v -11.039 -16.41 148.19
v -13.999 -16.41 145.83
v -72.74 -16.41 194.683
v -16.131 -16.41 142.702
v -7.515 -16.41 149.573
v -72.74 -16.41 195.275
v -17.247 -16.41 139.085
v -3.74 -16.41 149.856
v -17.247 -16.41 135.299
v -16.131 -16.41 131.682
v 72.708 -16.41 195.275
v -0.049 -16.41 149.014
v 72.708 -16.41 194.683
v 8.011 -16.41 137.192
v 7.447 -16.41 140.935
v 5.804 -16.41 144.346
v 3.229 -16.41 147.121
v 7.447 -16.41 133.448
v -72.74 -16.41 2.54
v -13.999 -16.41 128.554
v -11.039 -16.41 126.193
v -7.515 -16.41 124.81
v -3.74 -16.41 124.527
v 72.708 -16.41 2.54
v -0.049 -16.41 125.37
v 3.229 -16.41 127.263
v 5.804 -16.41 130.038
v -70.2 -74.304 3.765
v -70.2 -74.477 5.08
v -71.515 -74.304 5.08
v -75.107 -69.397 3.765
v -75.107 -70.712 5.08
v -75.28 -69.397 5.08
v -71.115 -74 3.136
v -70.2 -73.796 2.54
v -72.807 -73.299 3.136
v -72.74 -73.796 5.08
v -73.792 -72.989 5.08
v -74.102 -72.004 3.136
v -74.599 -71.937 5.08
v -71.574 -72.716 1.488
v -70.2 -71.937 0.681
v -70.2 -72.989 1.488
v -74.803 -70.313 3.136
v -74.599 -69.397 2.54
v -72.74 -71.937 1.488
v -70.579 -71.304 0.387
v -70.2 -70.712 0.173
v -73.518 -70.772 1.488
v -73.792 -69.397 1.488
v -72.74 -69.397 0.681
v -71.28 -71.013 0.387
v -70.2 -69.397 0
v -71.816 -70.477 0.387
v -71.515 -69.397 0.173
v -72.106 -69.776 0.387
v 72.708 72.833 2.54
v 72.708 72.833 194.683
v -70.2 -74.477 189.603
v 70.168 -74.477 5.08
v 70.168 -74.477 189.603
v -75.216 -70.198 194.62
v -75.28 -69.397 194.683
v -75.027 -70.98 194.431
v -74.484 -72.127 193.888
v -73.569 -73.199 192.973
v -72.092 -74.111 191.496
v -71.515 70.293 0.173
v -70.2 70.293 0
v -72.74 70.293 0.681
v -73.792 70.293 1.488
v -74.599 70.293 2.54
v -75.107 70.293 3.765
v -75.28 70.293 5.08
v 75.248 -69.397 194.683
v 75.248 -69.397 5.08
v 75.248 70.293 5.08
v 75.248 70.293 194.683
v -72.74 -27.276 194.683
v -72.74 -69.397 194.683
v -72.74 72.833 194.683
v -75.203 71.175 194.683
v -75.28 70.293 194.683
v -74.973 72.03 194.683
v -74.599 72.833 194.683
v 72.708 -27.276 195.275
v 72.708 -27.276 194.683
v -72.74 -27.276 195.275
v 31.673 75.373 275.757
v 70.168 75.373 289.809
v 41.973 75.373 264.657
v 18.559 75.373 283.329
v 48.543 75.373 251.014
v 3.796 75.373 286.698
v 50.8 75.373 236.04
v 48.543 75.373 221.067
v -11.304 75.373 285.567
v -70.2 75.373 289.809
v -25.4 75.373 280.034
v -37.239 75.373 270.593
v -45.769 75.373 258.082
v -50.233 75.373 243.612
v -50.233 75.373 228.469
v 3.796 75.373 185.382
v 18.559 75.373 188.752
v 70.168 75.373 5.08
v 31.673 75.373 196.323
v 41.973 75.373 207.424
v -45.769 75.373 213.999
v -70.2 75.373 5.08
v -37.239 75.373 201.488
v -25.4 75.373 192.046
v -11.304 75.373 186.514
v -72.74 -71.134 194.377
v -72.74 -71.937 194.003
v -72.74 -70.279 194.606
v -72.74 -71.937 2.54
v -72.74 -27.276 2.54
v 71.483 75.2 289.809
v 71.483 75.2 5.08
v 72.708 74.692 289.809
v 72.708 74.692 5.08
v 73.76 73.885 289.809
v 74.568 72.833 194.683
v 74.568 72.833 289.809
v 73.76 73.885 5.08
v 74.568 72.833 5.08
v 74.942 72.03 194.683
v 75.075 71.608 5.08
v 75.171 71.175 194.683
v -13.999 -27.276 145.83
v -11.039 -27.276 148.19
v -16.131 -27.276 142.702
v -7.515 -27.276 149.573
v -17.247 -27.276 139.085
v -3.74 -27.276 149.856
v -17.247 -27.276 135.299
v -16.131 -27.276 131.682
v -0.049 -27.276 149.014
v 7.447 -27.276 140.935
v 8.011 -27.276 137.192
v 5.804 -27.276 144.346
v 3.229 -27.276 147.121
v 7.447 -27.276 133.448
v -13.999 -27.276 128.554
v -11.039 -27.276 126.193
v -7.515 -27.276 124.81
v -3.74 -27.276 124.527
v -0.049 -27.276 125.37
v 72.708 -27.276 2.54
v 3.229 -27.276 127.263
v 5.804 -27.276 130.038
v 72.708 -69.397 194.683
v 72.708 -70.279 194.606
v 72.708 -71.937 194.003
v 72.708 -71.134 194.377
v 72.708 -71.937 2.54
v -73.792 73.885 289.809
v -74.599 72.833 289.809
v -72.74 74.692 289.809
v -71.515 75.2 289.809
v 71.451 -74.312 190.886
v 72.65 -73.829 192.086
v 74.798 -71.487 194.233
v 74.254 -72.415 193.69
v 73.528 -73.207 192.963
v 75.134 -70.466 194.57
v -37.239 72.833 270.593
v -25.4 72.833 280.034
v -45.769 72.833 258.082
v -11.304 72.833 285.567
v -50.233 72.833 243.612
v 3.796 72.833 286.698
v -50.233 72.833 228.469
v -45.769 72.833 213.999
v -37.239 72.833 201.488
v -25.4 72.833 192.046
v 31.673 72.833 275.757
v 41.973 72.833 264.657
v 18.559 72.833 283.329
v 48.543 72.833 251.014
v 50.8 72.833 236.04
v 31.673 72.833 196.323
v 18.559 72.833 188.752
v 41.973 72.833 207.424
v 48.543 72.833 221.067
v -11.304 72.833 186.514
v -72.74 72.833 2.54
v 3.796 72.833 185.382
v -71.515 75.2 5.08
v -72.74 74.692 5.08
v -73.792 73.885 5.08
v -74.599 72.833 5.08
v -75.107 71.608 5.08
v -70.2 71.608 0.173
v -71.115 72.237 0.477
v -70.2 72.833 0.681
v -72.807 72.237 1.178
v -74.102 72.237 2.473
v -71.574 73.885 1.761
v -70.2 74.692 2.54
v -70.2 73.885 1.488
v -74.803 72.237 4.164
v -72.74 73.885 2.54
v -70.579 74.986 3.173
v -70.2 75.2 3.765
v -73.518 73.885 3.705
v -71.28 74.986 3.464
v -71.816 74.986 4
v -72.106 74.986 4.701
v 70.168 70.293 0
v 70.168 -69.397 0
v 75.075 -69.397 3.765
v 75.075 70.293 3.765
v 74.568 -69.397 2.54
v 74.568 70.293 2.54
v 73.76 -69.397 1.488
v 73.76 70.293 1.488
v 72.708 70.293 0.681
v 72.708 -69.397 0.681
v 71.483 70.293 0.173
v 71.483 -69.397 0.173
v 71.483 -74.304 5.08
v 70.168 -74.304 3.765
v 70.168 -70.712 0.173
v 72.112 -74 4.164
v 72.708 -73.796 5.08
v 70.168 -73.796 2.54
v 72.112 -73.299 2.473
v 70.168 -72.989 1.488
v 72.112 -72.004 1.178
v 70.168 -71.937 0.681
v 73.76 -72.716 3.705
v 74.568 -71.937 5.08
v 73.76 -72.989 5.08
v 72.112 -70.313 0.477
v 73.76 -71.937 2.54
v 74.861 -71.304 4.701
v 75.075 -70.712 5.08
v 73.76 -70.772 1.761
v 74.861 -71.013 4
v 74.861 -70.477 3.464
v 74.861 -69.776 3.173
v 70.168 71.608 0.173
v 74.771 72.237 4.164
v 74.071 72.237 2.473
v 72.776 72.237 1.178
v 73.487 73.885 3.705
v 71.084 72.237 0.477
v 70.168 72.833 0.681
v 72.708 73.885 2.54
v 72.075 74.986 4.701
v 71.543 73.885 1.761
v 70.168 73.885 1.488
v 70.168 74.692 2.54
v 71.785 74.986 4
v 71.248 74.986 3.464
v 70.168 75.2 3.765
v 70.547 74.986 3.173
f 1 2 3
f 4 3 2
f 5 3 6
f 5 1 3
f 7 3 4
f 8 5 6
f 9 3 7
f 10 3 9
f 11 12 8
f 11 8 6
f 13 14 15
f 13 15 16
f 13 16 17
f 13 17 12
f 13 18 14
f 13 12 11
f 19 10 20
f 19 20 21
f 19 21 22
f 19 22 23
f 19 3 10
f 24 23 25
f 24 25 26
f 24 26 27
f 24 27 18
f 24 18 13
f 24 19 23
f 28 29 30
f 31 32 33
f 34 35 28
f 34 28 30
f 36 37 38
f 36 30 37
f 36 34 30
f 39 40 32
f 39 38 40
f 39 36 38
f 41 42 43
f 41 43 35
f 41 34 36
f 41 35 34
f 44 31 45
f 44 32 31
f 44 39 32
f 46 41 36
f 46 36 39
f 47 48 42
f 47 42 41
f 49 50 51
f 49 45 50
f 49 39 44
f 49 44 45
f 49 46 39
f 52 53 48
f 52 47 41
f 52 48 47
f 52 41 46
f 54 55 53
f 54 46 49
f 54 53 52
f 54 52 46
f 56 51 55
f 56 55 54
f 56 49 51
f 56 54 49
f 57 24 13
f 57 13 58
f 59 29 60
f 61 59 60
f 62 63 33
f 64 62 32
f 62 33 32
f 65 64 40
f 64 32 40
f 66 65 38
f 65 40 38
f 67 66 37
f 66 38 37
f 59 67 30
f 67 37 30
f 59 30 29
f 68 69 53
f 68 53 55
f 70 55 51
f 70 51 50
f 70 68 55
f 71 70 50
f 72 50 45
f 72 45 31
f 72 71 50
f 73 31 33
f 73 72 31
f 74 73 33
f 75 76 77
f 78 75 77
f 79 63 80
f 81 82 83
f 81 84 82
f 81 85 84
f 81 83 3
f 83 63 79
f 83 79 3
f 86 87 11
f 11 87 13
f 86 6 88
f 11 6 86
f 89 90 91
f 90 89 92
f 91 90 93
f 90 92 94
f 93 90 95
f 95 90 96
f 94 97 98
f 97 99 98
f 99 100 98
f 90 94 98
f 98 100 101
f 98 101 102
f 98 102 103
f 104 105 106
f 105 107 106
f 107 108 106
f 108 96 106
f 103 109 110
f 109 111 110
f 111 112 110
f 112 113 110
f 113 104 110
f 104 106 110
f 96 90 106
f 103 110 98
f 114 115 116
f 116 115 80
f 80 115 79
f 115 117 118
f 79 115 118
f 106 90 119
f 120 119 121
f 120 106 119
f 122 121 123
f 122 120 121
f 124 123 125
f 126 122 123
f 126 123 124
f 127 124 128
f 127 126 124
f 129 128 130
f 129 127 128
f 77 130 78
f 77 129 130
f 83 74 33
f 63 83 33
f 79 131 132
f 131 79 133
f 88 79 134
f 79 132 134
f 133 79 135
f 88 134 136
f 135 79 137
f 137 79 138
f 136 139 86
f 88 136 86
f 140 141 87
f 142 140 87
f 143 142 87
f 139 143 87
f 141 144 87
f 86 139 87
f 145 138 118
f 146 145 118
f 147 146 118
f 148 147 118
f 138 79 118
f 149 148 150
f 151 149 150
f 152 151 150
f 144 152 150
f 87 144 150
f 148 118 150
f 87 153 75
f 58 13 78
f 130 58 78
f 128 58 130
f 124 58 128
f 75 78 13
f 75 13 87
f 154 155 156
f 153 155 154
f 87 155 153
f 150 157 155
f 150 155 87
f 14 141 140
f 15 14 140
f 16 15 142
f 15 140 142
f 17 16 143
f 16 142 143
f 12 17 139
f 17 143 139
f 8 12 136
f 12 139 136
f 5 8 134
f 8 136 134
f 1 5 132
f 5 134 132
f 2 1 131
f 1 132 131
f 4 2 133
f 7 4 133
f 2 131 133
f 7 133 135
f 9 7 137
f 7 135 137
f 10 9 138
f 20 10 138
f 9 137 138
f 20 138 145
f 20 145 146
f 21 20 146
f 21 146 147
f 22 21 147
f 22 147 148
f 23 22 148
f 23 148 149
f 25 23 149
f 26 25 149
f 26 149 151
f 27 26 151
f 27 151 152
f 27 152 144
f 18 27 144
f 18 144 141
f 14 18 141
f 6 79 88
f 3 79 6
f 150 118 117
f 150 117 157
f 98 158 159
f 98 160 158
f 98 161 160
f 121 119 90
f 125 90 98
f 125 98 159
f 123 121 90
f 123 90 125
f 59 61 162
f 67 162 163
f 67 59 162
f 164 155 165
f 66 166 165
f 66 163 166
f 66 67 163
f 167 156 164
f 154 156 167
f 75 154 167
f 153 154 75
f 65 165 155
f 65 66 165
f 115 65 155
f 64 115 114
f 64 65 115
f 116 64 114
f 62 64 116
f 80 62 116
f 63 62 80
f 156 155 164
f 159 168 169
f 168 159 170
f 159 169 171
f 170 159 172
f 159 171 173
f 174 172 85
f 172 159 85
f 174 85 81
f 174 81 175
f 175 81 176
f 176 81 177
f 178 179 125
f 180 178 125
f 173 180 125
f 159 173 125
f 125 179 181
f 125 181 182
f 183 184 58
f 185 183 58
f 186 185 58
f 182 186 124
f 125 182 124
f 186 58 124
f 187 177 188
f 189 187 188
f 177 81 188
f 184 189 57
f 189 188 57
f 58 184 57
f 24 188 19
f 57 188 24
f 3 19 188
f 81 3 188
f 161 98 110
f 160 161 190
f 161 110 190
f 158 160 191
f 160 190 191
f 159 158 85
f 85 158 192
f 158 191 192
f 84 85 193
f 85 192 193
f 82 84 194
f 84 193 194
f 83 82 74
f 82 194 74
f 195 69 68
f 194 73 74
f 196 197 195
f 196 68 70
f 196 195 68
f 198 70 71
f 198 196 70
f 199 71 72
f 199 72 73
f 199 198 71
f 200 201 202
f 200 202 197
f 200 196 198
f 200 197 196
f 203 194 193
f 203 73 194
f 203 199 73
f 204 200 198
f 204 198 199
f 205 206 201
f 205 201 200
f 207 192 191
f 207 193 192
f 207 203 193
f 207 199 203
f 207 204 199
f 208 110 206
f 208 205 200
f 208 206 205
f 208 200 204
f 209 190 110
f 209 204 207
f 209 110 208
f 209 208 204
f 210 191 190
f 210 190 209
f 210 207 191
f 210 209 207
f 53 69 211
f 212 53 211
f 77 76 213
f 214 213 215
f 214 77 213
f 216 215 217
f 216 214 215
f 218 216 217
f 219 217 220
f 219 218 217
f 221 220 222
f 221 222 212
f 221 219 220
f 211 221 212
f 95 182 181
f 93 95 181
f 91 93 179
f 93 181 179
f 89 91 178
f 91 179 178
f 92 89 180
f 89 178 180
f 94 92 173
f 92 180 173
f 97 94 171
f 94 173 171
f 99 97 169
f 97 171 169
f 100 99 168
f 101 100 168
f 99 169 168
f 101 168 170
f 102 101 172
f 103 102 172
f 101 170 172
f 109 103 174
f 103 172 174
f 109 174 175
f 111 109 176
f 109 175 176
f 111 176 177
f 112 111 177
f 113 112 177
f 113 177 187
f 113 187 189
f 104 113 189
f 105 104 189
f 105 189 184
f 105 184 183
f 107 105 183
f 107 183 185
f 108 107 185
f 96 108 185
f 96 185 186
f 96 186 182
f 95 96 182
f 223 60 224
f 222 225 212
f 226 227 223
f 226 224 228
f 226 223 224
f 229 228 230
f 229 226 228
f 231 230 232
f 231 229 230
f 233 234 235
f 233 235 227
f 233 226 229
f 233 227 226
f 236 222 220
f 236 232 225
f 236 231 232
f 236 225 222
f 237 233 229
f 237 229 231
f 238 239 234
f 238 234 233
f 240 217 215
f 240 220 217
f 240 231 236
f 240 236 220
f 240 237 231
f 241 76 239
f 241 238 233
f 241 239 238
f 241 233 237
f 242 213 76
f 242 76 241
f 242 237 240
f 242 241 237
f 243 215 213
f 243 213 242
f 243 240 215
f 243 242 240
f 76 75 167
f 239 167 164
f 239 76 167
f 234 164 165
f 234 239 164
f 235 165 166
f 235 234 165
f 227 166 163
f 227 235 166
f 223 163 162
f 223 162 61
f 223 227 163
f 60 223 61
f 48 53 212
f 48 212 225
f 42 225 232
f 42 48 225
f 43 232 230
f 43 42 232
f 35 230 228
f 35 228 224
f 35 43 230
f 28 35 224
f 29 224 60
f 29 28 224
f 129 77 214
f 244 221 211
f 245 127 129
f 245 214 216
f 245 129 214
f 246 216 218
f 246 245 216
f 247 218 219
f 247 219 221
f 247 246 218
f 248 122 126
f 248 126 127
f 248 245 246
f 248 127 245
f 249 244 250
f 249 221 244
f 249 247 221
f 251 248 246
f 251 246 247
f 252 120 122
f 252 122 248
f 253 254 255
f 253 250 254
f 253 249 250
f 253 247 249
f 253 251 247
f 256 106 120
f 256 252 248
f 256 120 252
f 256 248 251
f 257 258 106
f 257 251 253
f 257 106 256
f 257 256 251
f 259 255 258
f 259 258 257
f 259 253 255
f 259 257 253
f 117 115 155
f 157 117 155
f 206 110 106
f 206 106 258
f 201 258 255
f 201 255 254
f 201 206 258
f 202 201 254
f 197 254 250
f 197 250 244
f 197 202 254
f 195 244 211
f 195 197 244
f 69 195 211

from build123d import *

# Parameters (mm, degrees)
F0_W         = 150.5279913545
F0_H         = 149.8499512672
F1_DEPTH     = 194.6834623814
F2_T         = -2.54
F3_W         = 2.54
F3_H         = 2.54
F4_DEPTH     = 95.1251834631
F6_D         = 101.6
F6_DEPTH     = 2.541
F7_T1_DEPTH  = 202.3034623814
F7_T3_DEPTH  = 297.4286458445
F7_T5_DEPTH  = 140.3679913545
F7_T7_DEPTH  = 139.6899512672
F7_T9_DEPTH  = 175.9279913545
F7_S13_W     = 5.08
F7_S13_H     = 5.08
F7_T14_DEPTH = 5.08
F7_S19_W     = 5.08
F7_S19_H     = 5.08
F7_T20_DEPTH = 5.08
F7_S25_W     = 5.08
F7_S25_H     = 5.08
F7_T26_DEPTH = 5.08
F7_S31_W     = 5.08
F7_S31_H     = 5.08
F7_T32_DEPTH = 5.08
F8_W         = 145.4479913545
F8_H         = 10.8655169606
F9_DEPTH     = 192.7349418402
F11_D        = 25.4
F11_DEPTH    = 12.7
F11_TIP      = 7.6309298617


# Not quite as in the source:
# - a fillet or chamfer that OpenCascade refuses, or shapes differently, is made with other operations: its cross-section is extruded or revolved along the edge and cut away or added


with BuildPart() as f1:
    # F0 (on Top) → F1 (new body)
    with BuildSketch(Plane.XY):
        with Locations((-0.0158064067, 0.4480481148)):
            Rectangle(F0_W, F0_H)
    extrude(amount=F1_DEPTH)

    # F2
    f2_openings = [f1.faces().sort_by_distance(p)[0] for p in [
        (-0.015806, 0.448048, 194.683462),
    ]]
    offset(amount=F2_T, openings=f2_openings)

    # F3 (on face) → F4 (join)
    with BuildSketch(Plane.XY.offset(194.6834623814)):
        Polygon((72.7081892705, 75.3730237484), (-75.279802084, 75.3730237484), (-75.279802084, 72.8330237484), (-72.739802084, 72.8330237484), (72.7081892705, 72.8330237484), align=None)
        with Locations((73.9781892705, 74.1030237484)):
            Rectangle(F3_W, F3_H)
    extrude(amount=F4_DEPTH)

    # F6 (through all, one way)
    with BuildSketch(Plane.XZ.offset(-72.8330237484)):
        with Locations((0, 236.040353775)):
            Circle(F6_D / 2)
    extrude(amount=-F6_DEPTH, mode=Mode.SUBTRACT)

    # F7: fillet of radius 5.08 on 9 edges, made by hand

    # F7_s2 → F7_t1 (cut)
    with BuildSketch(Plane.XY.offset(5.08)):
        with BuildLine():
            ThreePointArc((-75.279802084, -69.3969275188), (-73.7919045324, -72.9890299673), (-70.199802084, -74.4769275188))
            Line((-70.199802084, -74.4769275188), (-75.279802084, -74.4769275188))
            Line((-75.279802084, -74.4769275188), (-75.279802084, -69.3969275188))
        make_face()
        with BuildLine():
            ThreePointArc((75.2481892705, -69.3969275188), (73.7602917189, -72.9890299673), (70.1681892705, -74.4769275188))
            Line((70.1681892705, -74.4769275188), (75.2481892705, -74.4769275188))
            Line((75.2481892705, -74.4769275188), (75.2481892705, -69.3969275188))
        make_face()
    extrude(amount=F7_T1_DEPTH, mode=Mode.SUBTRACT)

    # F7_s4 → F7_t3 (cut)
    with BuildSketch(Plane.XY.offset(5.08)):
        with BuildLine():
            ThreePointArc((-70.199802084, 75.3730237484), (-73.7919045324, 73.8851261968), (-75.279802084, 70.2930237484))
            Line((-75.279802084, 70.2930237484), (-75.279802084, 75.3730237484))
            Line((-75.279802084, 75.3730237484), (-70.199802084, 75.3730237484))
        make_face()
        with BuildLine():
            ThreePointArc((70.1681892705, 75.3730237484), (73.7602917189, 73.8851261968), (75.2481892705, 70.2930237484))
            Line((75.2481892705, 70.2930237484), (75.2481892705, 75.3730237484))
            Line((75.2481892705, 75.3730237484), (70.1681892705, 75.3730237484))
        make_face()
    extrude(amount=F7_T3_DEPTH, mode=Mode.SUBTRACT)

    # F7_s6 → F7_t5 (cut)
    with BuildSketch(Plane.YZ.offset(-70.199802084)):
        with BuildLine():
            ThreePointArc((75.3730237484, 5.08), (73.8851261968, 1.4878975516), (70.2930237484, 0))
            Line((70.2930237484, 0), (75.3730237484, 0))
            Line((75.3730237484, 0), (75.3730237484, 5.08))
        make_face()
        with BuildLine():
            ThreePointArc((-69.3969275188, 0), (-72.9890299673, 1.4878975516), (-74.4769275188, 5.08))
            Line((-74.4769275188, 5.08), (-74.4769275188, 0))
            Line((-74.4769275188, 0), (-69.3969275188, 0))
        make_face()
    extrude(amount=F7_T5_DEPTH, mode=Mode.SUBTRACT)

    # F7_s8 → F7_t7 (cut)
    with BuildSketch(Plane.XZ.offset(-70.2930237484)):
        with BuildLine():
            ThreePointArc((-70.199802084, 0), (-73.7919045324, 1.4878975516), (-75.279802084, 5.08))
            Line((-75.279802084, 5.08), (-75.279802084, 0))
            Line((-75.279802084, 0), (-70.199802084, 0))
        make_face()
        with BuildLine():
            ThreePointArc((75.2481892705, 5.08), (73.7602917189, 1.4878975516), (70.1681892705, 0))
            Line((70.1681892705, 0), (75.2481892705, 0))
            Line((75.2481892705, 0), (75.2481892705, 5.08))
        make_face()
    extrude(amount=F7_T7_DEPTH, mode=Mode.SUBTRACT)

    # F7_s10 → F7_t9 (cut)
    with BuildSketch(Plane.YZ.offset(-87.979802084)):
        with BuildLine():
            ThreePointArc((-74.4769275188, 189.6034623814), (-72.9890299673, 193.1955648298), (-69.3969275188, 194.6834623814))
            Line((-69.3969275188, 194.6834623814), (-74.4769275188, 194.6834623814))
            Line((-74.4769275188, 194.6834623814), (-74.4769275188, 189.6034623814))
        make_face()
    extrude(amount=F7_T9_DEPTH, mode=Mode.SUBTRACT)


with BuildPart() as f7_tool12:
    # F7_s13 → F7_t14 (new body)
    with BuildSketch(Plane.XY.offset(5.08)):
        with Locations((-72.739802084, -71.9369275188)):
            Rectangle(F7_S13_W, F7_S13_H)
    extrude(amount=-F7_T14_DEPTH)

    # F7_s15 → F7_t16 (revolve, cut)
    with BuildSketch(Plane(origin=(-70.199802084, -69.3969275188, 5.08), x_dir=(0.7071067812, 0.7071067812, 0), z_dir=(-0.7071067812, 0.7071067812, 0))):
        with BuildLine():
            ThreePointArc((0, -5.08), (5.08, 0), (0, 5.08))
            Line((0, 5.08), (0, -5.08))
        make_face()
    revolve(axis=Axis((-70.199802084, -69.3969275188, 5.08), (0, 0, -1)), mode=Mode.SUBTRACT)


with BuildPart() as f1_1:
    add(f1.part)

    # F7_t11: cut F7_tool12
    add(f7_tool12.part, mode=Mode.SUBTRACT)


with BuildPart() as f7_tool18:
    # F7_s19 → F7_t20 (new body)
    with BuildSketch(Plane.XZ.offset(-70.2930237484)):
        with Locations((-72.739802084, 2.54)):
            Rectangle(F7_S19_W, F7_S19_H)
    extrude(amount=-F7_T20_DEPTH)

    # F7_s21 → F7_t22 (revolve, cut)
    with BuildSketch(Plane(origin=(-70.199802084, 70.2930237484, 5.08), x_dir=(0.7071067812, 0, 0.7071067812), z_dir=(-0.7071067812, 0, 0.7071067812))):
        with BuildLine():
            ThreePointArc((0, -5.08), (5.08, 0), (0, 5.08))
            Line((0, 5.08), (0, -5.08))
        make_face()
    revolve(axis=Axis((-70.199802084, 70.2930237484, 5.08), (0, 1, 0)), mode=Mode.SUBTRACT)


with BuildPart() as f1_2:
    add(f1_1.part)

    # F7_t17: cut F7_tool18
    add(f7_tool18.part, mode=Mode.SUBTRACT)


with BuildPart() as f7_tool24:
    # F7_s25 → F7_t26 (new body)
    with BuildSketch(Plane.XZ.offset(-70.2930237484)):
        with Locations((72.7081892705, 2.54)):
            Rectangle(F7_S25_W, F7_S25_H)
    extrude(amount=-F7_T26_DEPTH)

    # F7_s27 → F7_t28 (revolve, cut)
    with BuildSketch(Plane(origin=(70.1681892705, 70.2930237484, 5.08), x_dir=(-0.7071067812, 0, 0.7071067812), z_dir=(-0.7071067812, 0, -0.7071067812))):
        with BuildLine():
            ThreePointArc((0, -5.08), (5.08, 0), (0, 5.08))
            Line((0, 5.08), (0, -5.08))
        make_face()
    revolve(axis=Axis((70.1681892705, 70.2930237484, 5.08), (0, 1, 0)), mode=Mode.SUBTRACT)


with BuildPart() as f1_3:
    add(f1_2.part)

    # F7_t23: cut F7_tool24
    add(f7_tool24.part, mode=Mode.SUBTRACT)


with BuildPart() as f7_tool30:
    # F7_s31 → F7_t32 (new body)
    with BuildSketch(Plane.YZ.offset(70.1681892705)):
        with Locations((-71.9369275188, 2.54)):
            Rectangle(F7_S31_W, F7_S31_H)
    extrude(amount=F7_T32_DEPTH)

    # F7_s33 → F7_t34 (revolve, cut)
    with BuildSketch(Plane(origin=(70.1681892705, -69.3969275188, 5.08), x_dir=(0, 0.7071067812, 0.7071067812), z_dir=(0, 0.7071067812, -0.7071067812))):
        with BuildLine():
            ThreePointArc((0, -5.08), (5.08, 0), (0, 5.08))
            Line((0, 5.08), (0, -5.08))
        make_face()
    revolve(axis=Axis((70.1681892705, -69.3969275188, 5.08), (1, 0, 0)), mode=Mode.SUBTRACT)


with BuildPart() as f1_4:
    add(f1_3.part)

    # F7_t29: cut F7_tool30
    add(f7_tool30.part, mode=Mode.SUBTRACT)

    # F8 (on face) → F9 (join)
    with BuildSketch(Plane.XY.offset(2.54)):
        with Locations((-0.0158064067, -21.8428857625)):
            Rectangle(F8_W, F8_H)
    extrude(amount=F9_DEPTH)

    # F11 (one way)
    with BuildSketch(Plane.XZ.offset(27.2756442428)):
        with Locations((-4.689078778, 137.1918618679)):
            Circle(F11_D / 2)
    extrude(amount=-F11_DEPTH, mode=Mode.SUBTRACT)
    with Locations(Plane.XZ.offset(27.2756442428)):
        with Locations((-4.689078778, 137.1918618679)):
            with Locations((0, 0, -(F11_DEPTH + F11_TIP / 2))):  # 118° drill point
                Cone(0, F11_D / 2, F11_TIP, mode=Mode.SUBTRACT)


solid = f1_4.part
